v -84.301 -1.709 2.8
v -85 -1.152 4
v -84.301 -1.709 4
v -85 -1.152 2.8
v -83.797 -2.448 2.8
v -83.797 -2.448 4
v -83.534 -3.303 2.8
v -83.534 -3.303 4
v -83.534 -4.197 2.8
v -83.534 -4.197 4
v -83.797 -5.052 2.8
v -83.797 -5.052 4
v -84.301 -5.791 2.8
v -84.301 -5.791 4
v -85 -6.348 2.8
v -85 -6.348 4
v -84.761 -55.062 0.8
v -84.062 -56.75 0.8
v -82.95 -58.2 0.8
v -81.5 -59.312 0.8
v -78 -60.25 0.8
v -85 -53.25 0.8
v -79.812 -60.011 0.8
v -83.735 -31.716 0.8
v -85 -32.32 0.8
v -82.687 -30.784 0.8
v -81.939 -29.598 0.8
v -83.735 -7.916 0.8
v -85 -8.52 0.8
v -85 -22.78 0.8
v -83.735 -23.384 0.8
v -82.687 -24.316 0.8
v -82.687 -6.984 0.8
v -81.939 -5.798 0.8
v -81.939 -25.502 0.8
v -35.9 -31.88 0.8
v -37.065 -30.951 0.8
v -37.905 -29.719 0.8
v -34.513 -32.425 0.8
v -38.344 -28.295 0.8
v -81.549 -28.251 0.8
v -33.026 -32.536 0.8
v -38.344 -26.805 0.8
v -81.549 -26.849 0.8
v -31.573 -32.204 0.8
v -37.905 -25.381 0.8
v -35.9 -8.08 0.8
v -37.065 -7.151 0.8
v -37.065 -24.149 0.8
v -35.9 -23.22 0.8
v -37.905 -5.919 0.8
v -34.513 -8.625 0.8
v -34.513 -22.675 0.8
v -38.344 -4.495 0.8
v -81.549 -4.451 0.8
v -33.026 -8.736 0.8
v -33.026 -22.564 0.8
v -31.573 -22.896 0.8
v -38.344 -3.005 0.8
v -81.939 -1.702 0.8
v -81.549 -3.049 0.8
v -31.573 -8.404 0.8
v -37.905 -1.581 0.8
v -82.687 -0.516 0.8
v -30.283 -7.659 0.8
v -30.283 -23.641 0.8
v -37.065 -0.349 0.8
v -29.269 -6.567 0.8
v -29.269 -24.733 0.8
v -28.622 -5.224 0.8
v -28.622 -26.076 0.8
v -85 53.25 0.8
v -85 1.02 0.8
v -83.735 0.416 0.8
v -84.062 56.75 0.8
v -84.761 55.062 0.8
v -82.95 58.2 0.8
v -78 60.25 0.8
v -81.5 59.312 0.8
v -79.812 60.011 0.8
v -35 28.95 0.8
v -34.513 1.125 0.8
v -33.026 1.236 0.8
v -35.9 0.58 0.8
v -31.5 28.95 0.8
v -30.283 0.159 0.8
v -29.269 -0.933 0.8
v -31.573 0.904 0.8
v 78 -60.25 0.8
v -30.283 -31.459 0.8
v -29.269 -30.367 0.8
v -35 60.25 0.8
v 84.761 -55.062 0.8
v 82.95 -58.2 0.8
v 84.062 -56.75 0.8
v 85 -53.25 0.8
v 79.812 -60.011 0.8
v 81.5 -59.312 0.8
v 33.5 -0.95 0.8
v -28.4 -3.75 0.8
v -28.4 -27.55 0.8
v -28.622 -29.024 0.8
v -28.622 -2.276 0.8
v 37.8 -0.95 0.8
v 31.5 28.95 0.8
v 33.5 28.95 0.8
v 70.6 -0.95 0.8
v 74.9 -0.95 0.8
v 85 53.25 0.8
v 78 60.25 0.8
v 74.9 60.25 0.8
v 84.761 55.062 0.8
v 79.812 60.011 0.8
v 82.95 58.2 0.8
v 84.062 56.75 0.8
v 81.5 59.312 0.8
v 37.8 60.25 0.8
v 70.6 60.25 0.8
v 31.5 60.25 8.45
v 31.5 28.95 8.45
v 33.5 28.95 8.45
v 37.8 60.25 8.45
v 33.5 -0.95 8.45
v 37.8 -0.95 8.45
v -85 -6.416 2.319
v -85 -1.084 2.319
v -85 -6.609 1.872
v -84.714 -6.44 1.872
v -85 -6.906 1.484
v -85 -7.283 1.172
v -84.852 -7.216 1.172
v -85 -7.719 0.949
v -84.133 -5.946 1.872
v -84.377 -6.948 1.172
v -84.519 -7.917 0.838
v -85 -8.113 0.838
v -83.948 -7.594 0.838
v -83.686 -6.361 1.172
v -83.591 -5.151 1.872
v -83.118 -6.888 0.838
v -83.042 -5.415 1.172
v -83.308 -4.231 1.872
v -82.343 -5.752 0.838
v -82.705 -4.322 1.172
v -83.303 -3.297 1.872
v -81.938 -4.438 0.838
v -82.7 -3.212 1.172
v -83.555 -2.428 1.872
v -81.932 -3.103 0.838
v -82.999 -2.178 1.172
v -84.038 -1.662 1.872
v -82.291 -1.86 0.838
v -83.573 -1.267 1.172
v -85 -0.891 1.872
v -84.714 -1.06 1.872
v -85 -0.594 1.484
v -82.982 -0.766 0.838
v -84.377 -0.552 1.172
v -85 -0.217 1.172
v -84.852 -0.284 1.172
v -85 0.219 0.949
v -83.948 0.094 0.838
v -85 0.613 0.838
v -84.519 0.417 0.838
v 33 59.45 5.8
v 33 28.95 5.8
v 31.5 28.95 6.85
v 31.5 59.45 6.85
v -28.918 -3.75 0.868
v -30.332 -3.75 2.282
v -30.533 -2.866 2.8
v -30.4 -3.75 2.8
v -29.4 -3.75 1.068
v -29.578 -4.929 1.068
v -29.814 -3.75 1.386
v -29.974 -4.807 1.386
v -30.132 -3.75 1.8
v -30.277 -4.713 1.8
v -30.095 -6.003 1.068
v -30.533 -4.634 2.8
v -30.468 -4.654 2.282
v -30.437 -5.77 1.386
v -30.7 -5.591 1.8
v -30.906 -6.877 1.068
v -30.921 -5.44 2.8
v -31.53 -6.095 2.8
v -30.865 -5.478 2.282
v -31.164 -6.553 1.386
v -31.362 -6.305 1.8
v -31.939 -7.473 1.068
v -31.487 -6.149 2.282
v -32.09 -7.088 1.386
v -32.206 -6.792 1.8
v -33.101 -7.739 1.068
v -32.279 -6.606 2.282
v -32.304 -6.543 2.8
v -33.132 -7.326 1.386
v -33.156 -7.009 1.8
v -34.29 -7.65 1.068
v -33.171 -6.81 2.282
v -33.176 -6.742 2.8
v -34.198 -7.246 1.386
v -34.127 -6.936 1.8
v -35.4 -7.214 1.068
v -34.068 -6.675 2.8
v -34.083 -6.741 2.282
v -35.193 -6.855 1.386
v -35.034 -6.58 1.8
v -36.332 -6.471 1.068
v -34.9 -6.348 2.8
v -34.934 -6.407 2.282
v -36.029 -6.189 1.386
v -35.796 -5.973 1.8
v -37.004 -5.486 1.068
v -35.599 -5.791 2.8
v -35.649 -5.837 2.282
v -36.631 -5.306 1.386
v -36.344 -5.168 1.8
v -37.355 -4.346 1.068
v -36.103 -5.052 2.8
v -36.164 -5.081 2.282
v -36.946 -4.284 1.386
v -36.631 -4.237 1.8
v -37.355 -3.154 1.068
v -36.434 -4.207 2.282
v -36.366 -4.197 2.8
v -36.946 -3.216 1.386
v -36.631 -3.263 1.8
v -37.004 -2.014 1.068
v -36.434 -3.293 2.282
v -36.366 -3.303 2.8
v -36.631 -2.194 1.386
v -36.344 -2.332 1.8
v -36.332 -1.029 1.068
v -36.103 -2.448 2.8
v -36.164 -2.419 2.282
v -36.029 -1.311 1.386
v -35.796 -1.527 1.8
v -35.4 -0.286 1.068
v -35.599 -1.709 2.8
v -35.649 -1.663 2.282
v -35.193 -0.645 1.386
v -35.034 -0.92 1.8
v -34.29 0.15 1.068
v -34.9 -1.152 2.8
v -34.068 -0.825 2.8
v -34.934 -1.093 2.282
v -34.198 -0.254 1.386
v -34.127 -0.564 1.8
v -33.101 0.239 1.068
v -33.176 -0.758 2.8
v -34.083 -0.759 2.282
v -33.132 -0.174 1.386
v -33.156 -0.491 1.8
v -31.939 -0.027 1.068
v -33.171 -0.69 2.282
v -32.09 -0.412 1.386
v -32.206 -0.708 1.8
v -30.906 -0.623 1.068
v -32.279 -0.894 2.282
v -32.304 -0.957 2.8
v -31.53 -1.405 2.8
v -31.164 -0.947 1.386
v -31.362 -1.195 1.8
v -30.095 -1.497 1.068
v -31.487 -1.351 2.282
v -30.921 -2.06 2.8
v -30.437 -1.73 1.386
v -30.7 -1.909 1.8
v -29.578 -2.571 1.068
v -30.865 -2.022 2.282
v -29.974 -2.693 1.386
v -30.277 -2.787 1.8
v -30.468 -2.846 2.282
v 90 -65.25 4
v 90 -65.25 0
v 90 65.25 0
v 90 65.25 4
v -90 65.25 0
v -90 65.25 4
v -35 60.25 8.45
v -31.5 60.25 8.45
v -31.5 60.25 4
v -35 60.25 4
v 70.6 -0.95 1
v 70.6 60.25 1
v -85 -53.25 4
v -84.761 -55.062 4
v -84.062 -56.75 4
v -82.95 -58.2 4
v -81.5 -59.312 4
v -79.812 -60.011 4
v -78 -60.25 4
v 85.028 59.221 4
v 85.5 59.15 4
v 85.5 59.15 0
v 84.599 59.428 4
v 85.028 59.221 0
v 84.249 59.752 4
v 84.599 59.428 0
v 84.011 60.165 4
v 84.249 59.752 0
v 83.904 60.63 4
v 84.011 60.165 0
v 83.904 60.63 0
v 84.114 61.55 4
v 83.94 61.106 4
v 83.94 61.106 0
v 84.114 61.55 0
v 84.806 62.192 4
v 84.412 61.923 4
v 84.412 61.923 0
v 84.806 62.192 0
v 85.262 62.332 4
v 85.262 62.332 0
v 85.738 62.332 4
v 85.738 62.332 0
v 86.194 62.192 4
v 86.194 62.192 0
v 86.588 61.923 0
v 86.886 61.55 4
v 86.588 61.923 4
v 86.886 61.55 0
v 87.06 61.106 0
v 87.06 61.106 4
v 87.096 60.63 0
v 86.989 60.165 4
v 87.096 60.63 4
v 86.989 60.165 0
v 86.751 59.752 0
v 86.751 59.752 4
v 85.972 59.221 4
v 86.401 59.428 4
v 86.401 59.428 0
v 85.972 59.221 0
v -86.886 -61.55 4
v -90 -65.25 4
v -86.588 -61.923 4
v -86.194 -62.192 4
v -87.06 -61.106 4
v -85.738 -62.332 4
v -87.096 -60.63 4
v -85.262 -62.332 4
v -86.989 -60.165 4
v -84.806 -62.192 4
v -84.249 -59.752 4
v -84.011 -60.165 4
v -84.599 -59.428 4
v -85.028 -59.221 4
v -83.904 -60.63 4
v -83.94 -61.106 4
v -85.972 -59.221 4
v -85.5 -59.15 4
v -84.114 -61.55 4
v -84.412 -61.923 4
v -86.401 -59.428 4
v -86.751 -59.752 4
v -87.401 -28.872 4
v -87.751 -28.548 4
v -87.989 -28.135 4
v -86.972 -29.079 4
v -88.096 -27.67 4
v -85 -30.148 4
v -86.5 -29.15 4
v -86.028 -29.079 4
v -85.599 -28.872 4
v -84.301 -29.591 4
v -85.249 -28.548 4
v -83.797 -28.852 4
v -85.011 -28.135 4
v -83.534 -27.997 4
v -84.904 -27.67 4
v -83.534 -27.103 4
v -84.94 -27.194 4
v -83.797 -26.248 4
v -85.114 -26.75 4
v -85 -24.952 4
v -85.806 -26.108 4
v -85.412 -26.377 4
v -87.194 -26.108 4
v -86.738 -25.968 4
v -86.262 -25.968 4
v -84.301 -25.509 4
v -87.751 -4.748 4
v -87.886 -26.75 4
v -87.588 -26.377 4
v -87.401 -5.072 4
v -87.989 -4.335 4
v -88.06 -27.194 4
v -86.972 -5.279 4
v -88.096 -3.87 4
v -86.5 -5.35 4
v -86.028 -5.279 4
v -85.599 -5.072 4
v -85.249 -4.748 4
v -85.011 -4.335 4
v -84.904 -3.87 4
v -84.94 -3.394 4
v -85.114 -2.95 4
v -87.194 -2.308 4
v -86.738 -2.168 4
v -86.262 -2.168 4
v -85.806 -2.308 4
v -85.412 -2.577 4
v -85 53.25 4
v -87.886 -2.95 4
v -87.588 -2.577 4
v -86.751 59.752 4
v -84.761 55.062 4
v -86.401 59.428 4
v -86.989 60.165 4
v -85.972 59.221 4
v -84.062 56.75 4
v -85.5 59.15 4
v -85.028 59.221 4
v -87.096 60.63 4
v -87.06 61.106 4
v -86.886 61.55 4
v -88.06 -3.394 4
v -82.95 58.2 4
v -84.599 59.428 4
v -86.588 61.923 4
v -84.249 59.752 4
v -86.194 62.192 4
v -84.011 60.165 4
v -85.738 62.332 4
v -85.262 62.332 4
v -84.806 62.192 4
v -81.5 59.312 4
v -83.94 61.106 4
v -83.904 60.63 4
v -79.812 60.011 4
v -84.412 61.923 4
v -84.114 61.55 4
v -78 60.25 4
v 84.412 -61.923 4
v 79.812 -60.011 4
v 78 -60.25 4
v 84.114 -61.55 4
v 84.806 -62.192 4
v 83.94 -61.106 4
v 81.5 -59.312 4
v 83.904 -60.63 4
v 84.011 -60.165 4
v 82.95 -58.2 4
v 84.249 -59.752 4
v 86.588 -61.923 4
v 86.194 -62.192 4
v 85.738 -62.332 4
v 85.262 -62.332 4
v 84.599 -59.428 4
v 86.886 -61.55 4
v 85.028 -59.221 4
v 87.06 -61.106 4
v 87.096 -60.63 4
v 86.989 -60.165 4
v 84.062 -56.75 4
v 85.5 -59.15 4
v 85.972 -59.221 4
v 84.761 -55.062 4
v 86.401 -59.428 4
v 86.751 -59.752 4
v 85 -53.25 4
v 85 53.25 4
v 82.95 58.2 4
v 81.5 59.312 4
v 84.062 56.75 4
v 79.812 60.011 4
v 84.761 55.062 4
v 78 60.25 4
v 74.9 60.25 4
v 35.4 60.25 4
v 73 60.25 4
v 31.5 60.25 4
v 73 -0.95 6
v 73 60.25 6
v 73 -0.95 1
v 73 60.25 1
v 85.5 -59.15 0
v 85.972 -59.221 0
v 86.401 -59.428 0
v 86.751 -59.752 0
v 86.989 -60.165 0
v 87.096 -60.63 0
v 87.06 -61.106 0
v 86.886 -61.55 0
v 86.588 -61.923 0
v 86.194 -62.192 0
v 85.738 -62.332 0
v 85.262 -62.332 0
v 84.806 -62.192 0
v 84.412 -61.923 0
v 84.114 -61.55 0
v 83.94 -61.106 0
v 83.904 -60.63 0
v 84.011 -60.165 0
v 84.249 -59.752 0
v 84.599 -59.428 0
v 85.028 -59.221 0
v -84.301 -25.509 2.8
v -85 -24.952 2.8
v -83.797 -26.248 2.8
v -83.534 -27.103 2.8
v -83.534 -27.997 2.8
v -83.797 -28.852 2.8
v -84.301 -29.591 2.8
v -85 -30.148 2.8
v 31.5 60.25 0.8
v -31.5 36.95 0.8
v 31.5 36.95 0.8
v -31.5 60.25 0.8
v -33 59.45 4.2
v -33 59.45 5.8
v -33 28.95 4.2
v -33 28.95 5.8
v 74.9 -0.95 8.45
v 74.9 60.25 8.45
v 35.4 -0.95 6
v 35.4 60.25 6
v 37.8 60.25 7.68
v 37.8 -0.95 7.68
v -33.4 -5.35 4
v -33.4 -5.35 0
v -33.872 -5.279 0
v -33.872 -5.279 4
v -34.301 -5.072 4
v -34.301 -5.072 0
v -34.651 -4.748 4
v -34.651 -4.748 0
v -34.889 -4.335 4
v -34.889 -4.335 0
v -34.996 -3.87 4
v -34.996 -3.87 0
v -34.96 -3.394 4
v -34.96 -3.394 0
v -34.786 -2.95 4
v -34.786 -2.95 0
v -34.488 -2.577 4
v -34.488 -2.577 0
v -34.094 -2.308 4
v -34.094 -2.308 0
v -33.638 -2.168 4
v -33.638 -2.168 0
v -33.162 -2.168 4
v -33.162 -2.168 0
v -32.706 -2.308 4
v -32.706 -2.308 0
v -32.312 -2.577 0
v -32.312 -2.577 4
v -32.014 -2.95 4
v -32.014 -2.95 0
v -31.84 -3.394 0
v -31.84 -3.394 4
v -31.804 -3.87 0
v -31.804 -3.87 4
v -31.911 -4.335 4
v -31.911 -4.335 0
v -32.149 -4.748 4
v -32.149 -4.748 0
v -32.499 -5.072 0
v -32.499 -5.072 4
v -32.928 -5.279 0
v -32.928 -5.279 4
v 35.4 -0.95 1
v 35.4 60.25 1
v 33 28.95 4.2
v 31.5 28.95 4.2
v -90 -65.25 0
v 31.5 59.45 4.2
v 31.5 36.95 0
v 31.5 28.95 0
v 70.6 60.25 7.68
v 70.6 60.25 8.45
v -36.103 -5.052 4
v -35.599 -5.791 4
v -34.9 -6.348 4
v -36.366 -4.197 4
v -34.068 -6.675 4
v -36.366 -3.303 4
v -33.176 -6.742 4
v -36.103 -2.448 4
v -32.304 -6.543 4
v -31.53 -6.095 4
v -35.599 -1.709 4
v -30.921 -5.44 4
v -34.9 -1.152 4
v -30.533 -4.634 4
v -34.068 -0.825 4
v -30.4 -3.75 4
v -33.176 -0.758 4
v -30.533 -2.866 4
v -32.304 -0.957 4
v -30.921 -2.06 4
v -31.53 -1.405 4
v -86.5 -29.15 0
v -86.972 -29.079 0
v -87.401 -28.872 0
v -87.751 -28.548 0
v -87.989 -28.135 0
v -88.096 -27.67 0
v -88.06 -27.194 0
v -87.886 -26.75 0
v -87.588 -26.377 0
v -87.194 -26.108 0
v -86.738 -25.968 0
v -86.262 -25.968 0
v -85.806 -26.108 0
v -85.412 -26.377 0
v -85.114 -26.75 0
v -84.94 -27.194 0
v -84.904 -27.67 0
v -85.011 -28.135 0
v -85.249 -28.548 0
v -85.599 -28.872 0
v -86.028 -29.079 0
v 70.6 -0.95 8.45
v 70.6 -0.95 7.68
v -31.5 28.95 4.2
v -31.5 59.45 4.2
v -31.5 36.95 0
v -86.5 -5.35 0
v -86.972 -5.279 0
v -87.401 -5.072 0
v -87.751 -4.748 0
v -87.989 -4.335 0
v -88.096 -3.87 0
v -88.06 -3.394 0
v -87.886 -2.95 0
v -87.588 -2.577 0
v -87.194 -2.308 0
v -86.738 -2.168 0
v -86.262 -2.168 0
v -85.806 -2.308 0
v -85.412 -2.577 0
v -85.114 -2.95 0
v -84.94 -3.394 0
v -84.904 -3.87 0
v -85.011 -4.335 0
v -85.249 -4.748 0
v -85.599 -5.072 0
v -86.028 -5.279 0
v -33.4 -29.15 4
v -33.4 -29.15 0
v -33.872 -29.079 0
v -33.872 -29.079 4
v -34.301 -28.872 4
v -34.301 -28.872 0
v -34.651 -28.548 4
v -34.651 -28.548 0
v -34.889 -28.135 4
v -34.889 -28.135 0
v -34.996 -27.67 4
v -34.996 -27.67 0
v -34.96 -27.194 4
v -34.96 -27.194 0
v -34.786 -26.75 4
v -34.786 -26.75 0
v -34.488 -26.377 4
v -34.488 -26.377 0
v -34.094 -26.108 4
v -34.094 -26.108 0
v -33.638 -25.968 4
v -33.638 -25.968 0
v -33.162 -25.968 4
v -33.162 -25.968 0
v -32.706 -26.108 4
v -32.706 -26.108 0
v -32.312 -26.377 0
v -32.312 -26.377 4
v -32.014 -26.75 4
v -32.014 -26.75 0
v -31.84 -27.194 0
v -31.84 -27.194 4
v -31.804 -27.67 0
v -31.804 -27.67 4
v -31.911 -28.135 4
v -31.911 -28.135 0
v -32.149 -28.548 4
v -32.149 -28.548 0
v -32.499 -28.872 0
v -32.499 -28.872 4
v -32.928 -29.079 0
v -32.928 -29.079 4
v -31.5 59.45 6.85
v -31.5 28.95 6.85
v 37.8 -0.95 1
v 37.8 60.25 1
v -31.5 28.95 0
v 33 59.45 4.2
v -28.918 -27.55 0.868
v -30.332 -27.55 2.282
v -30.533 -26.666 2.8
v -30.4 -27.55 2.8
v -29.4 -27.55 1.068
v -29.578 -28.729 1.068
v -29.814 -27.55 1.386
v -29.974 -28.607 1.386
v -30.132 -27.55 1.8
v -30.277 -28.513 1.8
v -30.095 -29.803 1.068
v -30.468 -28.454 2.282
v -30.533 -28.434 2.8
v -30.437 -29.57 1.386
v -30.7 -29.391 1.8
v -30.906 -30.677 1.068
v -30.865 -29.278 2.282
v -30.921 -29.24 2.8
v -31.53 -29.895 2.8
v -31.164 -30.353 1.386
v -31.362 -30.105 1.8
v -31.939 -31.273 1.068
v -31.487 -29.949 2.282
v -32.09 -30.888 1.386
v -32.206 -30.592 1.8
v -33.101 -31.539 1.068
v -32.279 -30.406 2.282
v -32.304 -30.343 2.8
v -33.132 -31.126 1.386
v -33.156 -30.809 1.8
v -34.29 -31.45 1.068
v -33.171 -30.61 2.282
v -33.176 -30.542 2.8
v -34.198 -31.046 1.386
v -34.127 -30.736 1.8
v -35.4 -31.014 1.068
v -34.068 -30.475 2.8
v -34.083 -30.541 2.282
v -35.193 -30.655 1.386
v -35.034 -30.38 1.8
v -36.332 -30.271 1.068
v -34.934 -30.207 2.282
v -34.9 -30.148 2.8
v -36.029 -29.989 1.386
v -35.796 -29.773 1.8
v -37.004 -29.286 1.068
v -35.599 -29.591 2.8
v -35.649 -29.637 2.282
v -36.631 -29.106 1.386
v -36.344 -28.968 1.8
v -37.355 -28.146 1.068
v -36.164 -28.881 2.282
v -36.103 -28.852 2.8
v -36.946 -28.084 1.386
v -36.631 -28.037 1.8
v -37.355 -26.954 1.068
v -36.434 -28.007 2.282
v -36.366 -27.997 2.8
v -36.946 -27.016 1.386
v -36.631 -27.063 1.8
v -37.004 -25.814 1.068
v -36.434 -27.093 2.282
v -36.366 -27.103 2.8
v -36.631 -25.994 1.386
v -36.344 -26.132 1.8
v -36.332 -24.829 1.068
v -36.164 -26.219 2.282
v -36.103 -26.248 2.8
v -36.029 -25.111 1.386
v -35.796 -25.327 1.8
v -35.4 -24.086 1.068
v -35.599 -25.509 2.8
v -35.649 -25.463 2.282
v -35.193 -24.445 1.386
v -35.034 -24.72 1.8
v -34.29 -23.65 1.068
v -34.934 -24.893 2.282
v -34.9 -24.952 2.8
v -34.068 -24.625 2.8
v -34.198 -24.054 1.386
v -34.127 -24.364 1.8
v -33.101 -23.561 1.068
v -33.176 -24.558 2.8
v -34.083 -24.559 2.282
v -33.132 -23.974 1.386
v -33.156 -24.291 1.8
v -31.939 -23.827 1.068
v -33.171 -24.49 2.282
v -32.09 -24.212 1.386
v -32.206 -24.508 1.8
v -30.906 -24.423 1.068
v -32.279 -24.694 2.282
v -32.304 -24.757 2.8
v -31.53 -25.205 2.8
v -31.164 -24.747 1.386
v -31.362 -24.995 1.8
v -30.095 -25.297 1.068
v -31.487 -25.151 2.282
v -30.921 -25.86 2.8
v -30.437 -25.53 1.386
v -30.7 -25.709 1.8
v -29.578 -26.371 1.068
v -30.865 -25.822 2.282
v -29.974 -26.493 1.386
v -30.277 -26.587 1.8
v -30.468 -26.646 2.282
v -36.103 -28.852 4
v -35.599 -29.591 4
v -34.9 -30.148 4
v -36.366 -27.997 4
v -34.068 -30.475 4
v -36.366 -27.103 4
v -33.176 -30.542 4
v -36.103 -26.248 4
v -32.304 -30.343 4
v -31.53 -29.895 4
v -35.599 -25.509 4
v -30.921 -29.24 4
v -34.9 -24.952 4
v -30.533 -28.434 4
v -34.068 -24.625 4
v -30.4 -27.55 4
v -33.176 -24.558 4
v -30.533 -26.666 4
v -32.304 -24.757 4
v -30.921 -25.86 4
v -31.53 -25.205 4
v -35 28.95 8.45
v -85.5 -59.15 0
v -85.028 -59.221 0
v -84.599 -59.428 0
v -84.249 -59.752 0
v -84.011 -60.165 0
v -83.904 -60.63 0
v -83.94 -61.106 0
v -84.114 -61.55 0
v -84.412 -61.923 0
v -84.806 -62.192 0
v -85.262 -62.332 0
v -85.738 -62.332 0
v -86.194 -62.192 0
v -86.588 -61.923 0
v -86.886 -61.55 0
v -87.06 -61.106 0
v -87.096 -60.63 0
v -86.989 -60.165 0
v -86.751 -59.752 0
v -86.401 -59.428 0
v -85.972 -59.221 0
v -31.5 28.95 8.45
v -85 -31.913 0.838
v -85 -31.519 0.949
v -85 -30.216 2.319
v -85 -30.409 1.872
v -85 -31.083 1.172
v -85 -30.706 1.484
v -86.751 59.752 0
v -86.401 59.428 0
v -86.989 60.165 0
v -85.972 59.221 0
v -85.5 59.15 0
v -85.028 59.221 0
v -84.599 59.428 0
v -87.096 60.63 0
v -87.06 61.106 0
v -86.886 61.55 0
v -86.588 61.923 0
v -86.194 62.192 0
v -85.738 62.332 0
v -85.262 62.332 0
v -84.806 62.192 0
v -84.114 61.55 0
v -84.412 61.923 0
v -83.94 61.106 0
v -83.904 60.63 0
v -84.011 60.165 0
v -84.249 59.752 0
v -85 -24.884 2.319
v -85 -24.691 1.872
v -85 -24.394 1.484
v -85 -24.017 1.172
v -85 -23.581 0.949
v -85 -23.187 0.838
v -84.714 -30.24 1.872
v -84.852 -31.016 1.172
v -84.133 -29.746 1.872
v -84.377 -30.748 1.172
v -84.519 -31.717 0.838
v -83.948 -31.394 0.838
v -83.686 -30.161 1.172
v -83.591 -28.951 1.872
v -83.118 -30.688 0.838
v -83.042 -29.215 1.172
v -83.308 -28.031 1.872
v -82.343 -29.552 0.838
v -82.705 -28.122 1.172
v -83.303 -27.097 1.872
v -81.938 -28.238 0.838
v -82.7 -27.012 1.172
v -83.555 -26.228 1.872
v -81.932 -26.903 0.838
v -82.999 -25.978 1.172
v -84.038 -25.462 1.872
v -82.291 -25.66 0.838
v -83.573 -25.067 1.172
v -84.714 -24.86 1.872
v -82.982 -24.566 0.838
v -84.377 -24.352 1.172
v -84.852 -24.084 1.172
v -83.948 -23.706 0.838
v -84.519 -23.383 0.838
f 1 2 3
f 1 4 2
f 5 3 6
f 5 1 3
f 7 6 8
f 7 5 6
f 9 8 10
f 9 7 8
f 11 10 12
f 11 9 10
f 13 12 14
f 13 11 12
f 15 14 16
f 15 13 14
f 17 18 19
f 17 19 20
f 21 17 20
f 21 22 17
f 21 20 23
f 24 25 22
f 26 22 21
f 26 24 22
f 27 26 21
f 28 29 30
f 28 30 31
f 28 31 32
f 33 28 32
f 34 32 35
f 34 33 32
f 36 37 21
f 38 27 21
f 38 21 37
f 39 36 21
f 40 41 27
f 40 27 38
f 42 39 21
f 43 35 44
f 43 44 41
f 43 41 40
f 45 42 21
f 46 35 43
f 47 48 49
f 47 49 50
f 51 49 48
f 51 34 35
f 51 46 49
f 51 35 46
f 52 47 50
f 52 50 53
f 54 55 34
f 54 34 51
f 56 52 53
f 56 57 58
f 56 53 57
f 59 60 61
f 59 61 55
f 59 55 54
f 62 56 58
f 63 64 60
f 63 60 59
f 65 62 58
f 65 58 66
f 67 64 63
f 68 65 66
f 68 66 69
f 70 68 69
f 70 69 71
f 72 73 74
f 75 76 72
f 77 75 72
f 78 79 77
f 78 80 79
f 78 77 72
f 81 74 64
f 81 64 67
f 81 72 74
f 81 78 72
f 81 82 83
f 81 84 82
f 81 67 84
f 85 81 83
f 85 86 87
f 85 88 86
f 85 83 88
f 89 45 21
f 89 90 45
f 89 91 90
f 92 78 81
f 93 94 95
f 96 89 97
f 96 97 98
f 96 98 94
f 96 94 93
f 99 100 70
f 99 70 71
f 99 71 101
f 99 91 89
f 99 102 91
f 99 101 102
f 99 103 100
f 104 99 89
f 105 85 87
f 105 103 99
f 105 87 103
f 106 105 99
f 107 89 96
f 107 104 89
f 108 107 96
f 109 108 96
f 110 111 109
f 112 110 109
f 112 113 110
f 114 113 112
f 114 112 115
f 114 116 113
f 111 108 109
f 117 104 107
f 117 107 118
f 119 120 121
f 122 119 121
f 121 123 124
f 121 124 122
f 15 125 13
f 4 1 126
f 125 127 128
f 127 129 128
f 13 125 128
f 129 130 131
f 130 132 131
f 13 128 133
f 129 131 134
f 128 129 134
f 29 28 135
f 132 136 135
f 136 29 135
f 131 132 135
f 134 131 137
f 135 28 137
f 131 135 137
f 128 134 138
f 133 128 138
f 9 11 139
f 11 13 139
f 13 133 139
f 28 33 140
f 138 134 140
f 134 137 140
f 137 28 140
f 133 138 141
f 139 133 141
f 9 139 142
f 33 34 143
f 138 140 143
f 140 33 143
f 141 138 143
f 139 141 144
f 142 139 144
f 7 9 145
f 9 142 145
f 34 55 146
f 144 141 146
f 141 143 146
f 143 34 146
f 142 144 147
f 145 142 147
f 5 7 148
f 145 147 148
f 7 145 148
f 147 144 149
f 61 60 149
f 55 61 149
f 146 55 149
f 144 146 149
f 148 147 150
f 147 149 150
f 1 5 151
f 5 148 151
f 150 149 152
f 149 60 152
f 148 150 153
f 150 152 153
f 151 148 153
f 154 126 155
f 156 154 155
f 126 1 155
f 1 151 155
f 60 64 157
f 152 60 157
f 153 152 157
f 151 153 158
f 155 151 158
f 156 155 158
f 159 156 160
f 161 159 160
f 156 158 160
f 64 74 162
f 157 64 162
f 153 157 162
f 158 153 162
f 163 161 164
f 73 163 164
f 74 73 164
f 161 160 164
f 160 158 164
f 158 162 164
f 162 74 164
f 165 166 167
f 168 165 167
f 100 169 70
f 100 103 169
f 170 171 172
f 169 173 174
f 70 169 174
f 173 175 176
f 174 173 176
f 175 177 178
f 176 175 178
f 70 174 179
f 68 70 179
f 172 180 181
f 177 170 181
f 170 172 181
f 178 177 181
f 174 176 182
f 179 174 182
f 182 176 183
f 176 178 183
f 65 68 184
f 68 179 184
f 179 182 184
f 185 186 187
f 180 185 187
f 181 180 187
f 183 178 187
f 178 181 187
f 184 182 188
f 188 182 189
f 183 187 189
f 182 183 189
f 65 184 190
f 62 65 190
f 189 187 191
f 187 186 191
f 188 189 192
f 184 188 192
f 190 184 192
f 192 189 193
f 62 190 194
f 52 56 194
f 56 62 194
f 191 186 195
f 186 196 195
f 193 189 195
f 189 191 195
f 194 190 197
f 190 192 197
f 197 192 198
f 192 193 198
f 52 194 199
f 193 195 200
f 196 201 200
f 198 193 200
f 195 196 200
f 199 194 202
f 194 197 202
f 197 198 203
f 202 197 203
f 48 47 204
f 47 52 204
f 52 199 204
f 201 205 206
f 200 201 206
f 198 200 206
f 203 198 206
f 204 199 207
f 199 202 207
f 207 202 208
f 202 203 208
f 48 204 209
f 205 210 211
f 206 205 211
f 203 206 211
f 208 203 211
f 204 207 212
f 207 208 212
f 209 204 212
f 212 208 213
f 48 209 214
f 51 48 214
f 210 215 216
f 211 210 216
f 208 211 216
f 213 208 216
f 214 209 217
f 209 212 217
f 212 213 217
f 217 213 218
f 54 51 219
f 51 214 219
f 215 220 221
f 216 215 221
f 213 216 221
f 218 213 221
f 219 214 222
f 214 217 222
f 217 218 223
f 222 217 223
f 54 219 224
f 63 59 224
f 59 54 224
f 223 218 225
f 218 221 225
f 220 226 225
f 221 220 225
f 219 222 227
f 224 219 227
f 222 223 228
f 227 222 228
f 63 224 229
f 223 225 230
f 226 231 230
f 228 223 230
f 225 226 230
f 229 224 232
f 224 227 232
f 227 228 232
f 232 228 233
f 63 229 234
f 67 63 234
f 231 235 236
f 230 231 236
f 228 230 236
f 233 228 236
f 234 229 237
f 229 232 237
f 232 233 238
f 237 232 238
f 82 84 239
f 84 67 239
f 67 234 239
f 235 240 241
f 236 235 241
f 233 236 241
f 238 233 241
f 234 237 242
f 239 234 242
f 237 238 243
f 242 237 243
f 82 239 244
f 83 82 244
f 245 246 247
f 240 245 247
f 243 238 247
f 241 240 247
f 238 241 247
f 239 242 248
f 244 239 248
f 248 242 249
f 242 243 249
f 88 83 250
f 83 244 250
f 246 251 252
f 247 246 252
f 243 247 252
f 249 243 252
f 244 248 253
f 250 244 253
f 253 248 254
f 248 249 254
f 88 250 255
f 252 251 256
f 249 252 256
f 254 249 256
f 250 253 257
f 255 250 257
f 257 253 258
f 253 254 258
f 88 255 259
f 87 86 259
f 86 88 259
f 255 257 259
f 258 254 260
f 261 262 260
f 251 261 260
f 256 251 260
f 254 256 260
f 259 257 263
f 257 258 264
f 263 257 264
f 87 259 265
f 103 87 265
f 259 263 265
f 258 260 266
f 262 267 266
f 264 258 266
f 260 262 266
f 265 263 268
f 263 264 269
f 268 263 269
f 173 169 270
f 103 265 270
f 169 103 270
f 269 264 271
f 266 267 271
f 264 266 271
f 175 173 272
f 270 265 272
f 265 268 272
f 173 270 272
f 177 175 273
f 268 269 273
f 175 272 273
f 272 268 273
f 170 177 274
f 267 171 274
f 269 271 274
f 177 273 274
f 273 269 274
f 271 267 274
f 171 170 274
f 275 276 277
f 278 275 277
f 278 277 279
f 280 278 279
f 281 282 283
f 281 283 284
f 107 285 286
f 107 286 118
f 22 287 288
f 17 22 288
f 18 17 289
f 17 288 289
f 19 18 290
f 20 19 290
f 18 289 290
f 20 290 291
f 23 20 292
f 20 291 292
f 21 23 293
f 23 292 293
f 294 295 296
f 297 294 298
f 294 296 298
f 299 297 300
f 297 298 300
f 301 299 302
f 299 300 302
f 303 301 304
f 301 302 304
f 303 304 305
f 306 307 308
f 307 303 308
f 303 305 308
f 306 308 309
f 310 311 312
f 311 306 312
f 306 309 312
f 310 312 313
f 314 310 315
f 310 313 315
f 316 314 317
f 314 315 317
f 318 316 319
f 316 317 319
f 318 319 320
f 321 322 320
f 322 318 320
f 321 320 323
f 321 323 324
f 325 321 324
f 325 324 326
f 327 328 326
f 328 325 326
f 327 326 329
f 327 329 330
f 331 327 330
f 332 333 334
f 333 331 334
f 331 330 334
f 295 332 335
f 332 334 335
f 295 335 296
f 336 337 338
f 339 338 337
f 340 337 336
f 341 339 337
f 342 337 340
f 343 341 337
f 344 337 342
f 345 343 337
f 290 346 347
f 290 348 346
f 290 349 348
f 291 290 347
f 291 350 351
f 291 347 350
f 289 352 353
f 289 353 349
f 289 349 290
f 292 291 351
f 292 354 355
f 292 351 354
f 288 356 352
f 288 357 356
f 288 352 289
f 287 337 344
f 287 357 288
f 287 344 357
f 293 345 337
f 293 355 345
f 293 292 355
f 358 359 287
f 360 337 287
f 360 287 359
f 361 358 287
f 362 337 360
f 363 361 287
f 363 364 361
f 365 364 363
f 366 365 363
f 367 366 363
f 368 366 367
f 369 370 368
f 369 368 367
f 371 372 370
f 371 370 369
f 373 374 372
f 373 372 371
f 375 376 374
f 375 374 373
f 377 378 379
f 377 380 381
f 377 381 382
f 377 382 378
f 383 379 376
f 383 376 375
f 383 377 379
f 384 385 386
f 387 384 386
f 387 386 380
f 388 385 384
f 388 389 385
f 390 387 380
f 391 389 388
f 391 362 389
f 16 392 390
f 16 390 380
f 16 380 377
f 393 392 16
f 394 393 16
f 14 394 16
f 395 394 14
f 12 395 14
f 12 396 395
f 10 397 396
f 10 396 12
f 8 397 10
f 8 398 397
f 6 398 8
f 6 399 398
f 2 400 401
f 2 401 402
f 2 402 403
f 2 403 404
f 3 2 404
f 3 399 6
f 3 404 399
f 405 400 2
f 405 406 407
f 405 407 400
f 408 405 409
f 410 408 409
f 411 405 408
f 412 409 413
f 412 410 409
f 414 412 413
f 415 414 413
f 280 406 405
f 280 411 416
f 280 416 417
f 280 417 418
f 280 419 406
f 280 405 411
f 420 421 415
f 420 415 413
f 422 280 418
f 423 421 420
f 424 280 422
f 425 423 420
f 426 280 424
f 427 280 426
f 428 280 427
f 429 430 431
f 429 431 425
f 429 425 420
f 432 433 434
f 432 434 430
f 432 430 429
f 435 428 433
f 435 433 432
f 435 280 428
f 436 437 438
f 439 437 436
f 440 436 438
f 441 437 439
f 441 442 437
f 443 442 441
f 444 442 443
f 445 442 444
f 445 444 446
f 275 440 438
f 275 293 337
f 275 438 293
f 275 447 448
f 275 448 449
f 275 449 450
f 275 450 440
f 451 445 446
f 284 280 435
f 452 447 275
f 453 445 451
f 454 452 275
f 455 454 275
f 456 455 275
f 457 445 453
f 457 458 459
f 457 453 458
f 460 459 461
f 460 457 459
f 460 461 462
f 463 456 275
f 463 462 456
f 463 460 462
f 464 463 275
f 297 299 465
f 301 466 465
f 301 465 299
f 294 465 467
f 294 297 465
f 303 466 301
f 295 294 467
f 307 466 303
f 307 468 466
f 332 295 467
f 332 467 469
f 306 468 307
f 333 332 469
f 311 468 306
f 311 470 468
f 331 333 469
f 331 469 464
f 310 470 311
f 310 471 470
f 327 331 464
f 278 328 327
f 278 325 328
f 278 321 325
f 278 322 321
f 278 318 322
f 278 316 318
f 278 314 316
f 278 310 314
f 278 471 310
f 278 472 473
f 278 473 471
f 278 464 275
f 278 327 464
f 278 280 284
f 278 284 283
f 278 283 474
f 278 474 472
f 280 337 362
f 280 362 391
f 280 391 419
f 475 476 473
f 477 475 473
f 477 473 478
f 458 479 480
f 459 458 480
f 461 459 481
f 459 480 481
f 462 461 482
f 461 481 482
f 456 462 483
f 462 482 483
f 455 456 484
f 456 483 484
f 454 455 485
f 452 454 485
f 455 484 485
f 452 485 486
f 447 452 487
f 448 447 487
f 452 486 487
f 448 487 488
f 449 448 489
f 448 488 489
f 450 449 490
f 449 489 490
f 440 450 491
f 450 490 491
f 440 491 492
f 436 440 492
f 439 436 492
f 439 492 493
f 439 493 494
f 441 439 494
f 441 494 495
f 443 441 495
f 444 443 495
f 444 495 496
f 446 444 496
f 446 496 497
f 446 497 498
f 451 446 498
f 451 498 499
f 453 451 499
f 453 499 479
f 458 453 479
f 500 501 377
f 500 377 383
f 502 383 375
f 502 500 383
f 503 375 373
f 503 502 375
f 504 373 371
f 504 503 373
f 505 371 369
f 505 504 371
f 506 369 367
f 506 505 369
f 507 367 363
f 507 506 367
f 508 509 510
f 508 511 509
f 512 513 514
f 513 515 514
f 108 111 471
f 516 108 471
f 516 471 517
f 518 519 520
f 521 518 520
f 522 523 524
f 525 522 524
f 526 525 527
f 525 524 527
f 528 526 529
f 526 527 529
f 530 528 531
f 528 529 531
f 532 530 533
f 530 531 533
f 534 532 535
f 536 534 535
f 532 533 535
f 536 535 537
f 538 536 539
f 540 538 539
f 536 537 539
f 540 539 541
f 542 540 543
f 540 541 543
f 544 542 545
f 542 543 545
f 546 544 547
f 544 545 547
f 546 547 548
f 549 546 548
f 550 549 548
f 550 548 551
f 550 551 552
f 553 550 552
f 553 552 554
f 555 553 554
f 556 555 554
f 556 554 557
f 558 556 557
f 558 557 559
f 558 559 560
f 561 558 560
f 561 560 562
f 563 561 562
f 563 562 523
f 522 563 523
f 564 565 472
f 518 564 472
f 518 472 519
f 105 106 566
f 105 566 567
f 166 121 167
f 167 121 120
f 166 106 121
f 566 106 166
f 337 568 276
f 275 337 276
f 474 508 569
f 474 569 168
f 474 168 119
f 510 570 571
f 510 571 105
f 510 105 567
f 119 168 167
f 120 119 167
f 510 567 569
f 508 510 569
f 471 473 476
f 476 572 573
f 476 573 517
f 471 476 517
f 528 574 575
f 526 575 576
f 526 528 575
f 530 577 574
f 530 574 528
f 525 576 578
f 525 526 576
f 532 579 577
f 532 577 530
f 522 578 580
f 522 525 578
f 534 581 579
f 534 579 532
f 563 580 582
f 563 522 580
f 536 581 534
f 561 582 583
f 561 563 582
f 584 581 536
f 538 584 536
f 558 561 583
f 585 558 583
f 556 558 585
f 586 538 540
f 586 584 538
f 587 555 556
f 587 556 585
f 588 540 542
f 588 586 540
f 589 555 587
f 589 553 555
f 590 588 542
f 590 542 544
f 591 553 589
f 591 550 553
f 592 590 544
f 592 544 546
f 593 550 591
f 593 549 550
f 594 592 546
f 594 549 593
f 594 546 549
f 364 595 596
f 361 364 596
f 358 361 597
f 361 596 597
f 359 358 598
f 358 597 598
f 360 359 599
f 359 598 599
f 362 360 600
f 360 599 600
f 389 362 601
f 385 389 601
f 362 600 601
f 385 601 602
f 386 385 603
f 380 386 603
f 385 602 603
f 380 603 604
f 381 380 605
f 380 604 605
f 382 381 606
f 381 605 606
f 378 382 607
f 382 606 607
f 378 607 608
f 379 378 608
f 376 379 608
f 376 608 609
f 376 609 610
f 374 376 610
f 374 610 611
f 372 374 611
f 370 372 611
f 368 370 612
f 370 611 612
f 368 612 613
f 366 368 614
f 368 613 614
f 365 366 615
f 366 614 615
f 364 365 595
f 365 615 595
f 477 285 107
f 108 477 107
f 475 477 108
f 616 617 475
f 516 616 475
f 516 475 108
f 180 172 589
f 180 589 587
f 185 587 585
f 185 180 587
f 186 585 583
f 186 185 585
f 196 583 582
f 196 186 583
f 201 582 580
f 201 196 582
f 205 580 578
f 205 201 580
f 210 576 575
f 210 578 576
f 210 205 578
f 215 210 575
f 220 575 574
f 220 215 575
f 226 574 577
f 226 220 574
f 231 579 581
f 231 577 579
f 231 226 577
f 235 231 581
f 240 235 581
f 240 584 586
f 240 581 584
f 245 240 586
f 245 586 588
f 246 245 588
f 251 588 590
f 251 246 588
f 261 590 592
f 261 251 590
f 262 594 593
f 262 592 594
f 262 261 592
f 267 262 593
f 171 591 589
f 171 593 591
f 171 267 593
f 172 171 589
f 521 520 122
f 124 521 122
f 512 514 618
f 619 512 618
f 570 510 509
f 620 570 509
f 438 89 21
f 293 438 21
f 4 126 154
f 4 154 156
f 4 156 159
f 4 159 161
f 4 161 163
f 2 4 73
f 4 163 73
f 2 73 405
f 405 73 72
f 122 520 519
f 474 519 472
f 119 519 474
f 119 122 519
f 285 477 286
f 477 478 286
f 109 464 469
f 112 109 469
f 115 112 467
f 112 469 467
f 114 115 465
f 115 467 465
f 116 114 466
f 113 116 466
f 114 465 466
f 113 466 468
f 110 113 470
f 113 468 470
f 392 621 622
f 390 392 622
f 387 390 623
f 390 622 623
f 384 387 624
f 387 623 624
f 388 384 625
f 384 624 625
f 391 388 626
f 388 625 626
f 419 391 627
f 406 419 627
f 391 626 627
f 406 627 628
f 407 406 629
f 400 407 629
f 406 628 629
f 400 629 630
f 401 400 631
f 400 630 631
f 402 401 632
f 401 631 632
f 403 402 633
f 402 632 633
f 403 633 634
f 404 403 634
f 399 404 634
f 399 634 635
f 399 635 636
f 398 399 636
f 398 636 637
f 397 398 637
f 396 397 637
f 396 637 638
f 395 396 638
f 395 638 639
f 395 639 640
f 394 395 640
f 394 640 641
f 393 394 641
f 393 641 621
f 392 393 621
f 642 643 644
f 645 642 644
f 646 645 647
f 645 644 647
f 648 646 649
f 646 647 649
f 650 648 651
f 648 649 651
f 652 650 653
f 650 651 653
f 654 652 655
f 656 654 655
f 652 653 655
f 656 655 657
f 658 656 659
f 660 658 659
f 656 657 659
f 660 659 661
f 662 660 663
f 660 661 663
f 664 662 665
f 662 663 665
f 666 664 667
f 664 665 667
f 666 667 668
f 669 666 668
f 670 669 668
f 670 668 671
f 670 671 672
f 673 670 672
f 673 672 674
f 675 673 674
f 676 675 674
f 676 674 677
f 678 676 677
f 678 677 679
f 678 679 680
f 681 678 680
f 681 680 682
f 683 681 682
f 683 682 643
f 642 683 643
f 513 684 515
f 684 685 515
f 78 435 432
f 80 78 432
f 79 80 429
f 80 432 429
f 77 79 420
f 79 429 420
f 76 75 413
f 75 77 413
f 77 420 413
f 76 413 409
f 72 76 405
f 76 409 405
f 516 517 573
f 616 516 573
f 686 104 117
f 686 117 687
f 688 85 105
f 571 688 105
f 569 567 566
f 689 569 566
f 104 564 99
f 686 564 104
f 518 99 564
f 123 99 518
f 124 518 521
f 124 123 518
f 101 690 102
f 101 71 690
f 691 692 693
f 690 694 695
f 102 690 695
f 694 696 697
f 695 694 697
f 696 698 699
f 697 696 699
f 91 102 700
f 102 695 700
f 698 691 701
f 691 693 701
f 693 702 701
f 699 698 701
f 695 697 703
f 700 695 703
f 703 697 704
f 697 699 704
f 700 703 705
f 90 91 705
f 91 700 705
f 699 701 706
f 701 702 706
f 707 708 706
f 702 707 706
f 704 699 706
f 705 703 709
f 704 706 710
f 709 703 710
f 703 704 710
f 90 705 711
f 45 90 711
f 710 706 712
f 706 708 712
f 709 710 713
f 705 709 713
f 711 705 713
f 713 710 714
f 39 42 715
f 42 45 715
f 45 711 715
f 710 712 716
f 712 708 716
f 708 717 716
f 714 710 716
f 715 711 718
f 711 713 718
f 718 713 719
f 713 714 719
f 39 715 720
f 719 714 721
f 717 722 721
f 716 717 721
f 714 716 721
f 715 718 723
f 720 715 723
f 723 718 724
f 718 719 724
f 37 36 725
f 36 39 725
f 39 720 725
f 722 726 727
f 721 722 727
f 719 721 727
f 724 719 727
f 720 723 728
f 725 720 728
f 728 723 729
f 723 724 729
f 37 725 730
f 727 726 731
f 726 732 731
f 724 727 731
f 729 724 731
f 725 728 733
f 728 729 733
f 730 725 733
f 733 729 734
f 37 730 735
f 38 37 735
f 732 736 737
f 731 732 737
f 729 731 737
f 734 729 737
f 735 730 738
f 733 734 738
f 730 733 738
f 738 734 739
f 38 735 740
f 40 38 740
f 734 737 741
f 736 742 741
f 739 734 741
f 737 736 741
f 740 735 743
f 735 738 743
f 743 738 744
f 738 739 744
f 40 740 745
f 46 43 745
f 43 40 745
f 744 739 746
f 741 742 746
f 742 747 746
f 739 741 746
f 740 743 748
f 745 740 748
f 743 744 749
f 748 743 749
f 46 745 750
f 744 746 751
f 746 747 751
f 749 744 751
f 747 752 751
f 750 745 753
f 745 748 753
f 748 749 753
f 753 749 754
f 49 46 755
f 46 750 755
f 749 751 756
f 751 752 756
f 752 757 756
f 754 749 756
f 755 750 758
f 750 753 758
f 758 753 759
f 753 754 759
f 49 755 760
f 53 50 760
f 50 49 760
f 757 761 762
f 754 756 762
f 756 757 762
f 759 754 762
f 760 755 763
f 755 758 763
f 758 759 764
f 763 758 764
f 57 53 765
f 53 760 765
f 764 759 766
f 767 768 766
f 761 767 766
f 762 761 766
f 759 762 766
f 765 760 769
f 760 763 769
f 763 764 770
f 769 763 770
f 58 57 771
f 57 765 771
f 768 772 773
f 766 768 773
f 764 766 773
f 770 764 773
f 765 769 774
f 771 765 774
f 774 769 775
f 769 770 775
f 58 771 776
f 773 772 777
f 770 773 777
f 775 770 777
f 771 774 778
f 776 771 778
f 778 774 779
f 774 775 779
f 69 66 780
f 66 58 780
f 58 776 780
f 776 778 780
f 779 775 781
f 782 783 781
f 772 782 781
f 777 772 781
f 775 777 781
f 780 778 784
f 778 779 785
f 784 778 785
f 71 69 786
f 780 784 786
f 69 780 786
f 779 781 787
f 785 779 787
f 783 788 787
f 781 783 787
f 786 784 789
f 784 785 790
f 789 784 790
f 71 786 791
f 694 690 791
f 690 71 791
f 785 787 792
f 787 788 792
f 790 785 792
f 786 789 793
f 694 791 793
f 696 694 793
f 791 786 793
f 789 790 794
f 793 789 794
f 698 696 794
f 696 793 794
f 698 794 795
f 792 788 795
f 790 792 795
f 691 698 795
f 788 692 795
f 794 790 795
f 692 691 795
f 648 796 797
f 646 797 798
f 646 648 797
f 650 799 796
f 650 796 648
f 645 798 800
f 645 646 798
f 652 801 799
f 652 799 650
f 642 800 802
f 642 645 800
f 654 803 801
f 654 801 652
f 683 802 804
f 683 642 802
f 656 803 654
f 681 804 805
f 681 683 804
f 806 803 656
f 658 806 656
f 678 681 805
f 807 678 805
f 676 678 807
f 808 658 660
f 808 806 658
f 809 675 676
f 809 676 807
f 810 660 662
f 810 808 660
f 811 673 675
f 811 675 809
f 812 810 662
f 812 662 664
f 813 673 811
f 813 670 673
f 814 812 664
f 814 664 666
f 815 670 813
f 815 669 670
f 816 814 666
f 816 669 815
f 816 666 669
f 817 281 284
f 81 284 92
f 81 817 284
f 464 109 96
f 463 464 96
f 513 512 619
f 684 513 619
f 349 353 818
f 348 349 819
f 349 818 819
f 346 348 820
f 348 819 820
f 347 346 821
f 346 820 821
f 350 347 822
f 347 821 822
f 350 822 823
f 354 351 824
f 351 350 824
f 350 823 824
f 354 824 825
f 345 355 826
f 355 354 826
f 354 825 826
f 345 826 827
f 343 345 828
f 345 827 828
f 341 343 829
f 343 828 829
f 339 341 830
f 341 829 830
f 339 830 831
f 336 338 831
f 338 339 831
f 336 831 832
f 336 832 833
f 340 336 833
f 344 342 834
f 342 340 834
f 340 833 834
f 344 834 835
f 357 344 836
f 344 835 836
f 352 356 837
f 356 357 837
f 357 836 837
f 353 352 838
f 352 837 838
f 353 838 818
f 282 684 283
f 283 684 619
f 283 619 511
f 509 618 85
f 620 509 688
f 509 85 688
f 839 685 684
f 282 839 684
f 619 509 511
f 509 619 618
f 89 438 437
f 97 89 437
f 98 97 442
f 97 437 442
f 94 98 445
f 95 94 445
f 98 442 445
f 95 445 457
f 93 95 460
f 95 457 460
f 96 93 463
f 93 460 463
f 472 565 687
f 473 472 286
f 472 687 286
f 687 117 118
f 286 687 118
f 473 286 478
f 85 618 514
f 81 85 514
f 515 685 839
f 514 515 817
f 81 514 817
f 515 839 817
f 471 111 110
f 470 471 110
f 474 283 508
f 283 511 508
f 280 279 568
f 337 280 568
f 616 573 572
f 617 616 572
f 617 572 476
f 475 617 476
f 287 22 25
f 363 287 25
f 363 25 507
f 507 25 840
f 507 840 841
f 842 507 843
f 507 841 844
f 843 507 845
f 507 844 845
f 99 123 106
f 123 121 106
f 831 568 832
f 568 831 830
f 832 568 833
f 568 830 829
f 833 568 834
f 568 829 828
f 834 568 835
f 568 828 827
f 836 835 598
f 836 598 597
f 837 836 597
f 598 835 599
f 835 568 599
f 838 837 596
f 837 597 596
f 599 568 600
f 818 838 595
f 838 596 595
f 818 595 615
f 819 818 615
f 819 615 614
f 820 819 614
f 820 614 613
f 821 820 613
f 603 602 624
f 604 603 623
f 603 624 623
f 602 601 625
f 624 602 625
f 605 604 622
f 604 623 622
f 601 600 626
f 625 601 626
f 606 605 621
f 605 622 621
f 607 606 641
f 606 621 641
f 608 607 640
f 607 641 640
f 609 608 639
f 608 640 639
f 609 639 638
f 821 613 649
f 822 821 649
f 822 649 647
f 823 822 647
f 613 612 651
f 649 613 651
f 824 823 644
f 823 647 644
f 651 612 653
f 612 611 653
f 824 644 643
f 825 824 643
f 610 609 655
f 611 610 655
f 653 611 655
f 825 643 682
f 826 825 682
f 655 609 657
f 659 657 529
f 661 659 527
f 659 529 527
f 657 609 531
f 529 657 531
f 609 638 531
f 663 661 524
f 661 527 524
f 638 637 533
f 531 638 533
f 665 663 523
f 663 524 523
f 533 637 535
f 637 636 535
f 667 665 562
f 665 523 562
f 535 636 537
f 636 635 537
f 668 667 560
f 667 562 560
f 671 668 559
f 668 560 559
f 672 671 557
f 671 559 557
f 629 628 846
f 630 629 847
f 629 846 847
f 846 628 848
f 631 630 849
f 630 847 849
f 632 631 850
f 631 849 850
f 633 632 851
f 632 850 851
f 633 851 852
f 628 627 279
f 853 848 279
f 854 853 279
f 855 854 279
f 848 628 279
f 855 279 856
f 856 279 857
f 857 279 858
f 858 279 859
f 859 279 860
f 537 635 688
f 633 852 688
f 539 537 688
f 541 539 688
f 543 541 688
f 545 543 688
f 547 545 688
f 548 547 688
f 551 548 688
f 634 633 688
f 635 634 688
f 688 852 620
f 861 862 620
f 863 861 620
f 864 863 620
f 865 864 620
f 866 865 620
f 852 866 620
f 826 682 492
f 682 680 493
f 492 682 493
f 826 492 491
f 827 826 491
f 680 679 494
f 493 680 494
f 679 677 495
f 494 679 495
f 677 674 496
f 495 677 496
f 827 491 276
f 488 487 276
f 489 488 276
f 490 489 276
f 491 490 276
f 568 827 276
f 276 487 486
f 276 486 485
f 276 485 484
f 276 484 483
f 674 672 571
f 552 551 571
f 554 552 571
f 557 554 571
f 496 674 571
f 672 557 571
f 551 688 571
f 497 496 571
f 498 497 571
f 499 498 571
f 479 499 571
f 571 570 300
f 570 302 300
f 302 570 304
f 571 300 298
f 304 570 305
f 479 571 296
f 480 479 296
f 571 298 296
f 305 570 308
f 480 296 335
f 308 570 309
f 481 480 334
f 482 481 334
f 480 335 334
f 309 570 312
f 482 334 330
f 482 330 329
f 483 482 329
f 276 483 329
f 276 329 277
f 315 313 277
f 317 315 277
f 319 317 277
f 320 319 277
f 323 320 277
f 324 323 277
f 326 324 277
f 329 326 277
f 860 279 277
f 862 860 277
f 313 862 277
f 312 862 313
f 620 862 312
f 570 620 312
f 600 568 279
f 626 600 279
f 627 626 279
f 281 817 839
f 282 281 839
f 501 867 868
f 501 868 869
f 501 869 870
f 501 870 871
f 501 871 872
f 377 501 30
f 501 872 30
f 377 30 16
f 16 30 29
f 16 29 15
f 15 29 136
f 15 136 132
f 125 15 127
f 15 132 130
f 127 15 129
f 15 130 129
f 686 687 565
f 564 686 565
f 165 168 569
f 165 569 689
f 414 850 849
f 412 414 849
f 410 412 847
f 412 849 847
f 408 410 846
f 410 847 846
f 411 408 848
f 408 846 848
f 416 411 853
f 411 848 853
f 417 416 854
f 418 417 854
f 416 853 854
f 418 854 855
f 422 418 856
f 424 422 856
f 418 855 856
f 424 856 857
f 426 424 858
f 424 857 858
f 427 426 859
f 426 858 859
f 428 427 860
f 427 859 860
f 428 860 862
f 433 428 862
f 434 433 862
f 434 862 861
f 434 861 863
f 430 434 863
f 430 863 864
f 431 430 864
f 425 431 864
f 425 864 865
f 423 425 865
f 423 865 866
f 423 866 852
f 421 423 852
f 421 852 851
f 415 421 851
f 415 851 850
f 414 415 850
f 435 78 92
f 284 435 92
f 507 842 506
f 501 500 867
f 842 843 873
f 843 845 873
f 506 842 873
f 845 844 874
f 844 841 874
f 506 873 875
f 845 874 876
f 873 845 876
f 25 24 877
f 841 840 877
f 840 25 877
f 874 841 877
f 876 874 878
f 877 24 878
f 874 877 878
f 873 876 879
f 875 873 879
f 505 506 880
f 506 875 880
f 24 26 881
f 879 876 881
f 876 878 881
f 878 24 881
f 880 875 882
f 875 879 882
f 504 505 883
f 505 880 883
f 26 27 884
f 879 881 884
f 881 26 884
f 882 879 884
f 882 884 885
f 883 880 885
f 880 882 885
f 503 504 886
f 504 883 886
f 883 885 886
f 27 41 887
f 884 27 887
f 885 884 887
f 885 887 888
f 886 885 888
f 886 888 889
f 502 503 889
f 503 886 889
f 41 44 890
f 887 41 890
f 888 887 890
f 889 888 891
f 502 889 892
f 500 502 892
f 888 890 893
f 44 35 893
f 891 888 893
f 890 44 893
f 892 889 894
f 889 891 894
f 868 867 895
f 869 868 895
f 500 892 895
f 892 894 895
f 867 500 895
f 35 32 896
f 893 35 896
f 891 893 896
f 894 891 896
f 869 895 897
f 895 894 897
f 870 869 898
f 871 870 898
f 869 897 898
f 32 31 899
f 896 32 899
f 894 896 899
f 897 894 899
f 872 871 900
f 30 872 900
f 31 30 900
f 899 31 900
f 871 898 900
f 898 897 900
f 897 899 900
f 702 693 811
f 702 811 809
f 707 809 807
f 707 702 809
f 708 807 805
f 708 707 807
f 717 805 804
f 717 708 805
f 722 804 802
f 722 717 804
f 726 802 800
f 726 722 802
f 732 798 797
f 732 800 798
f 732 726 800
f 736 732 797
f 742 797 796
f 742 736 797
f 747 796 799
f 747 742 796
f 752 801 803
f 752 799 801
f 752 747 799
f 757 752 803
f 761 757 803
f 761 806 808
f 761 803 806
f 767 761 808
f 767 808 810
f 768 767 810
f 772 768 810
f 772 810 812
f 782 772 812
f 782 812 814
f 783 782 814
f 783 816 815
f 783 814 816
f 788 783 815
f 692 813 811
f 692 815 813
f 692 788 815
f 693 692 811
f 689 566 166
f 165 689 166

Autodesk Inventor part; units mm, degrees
ref_plane "YZ Plane" through (0, 0, 0) normal (1, 0, 0) x (0, 1, 0)
ref_plane "XY Plane" through (0, 0, 0) normal (0, 0, 1) x (1, 0, 0)
sketch "Skizze1" plane through (0, 0, 0) normal (0, 0, 1) x (1, 0, 0)
  line L0 (-90, -65.25) -> (90, -65.25)
  line L1 (90, -65.25) -> (90, 65.25)
  line L2 (90, 65.25) -> (-90, 65.25)
  line L3 (-90, 65.25) -> (-90, -65.25)
  line L4 (-90, -65.25) -> (90, 65.25) construction
  line L5 (90, -65.25) -> (-90, 65.25) construction
  point P0 (0, 0)
  dimension "d0" = 180
  dimension "d1" = 130.5
extrude "Extrusion1" add sketch "Skizze1" along normal blind 0.8
sketch "Skizze2" plane through (0, 0, 0.8) normal (0, 0, 1) x (1, 0, 0)
  line L0 (90, -65.25) -> (90, 65.25) projected
  line L1 (90, 65.25) -> (-90, 65.25) projected
  line L2 (-90, 65.25) -> (-90, -65.25) projected
  line L3 (-90, -65.25) -> (90, -65.25) projected
  line L4 (-85, 60.25) -> (85, 60.25)
  line L5 (85, 60.25) -> (85, -60.25)
  line L6 (85, -60.25) -> (-85, -60.25)
  line L7 (-85, -60.25) -> (-85, 60.25)
  point P0 (0, 0)
  dimension "d4" = 5
extrude "Extrusion2" add sketch "Skizze2" along normal blind 3.2
ref_plane "Arbeitsebene1" through (0, 28.95, 0) normal (0, 1, 0) x (-1, 0, 0)
sketch "Skizze4" plane through (0, 28.95, 0) normal (0, 1, 0) x (-1, 0, 0)
  line L0 (0, 0) -> (0, 5.6907) construction
  line L1 (-85, 0.8) -> (85, 0.8) projected
  line L2 (31.5, 0.8) -> (35, 0.8)
  line L3 (35, 8.4503) -> (31.5, 8.4503)
  line L4 (35, 8.4503) -> (35, 0.8)
  line L5 (31.5, 8.4503) -> (31.5, 6.8503)
  line L6 (31.5, 6.8503) -> (33, 5.8)
  line L7 (33, 5.8) -> (31.5, 6.8503)
  line L8 (33, 5.8) -> (33, 4.2)
  line L9 (33, 4.2) -> (31.5, 4.2)
  line L10 (31.5, 4.2) -> (31.5, 0.8)
  line L11 (-90, 0) -> (90, 0) projected
  dimension "d8" = 33
  dimension "d9" = 1.6
  dimension "d11" = 125
  dimension "d12" = 1.5
  dimension "d13" = 1.6
  dimension "d14" = 2
  dimension "d17" = 4.2
extrude "Extrusion3" add sketch "Skizze4" along normal up to surface (31.3 mm away)
sketch "Skizze5" plane through (-35, 60.25, 4) normal (0, 1, 0) x (1, 0, 0)
  line L0 (0, -4.4503) -> (3.5, -4.4503) projected
  line L1 (2, -0.2) -> (3.5, -0.2) projected
  line L2 (3.5, -4.4503) -> (3.5, -0.2)
  line L3 (3.5, -0.2) -> (0, -0.2)
  line L4 (0, 3.2) -> (0, -4.4503) projected
  line L5 (0, -0.2) -> (0, -4.4503)
  line L6 (0, -4.4503) -> (3.5, -4.4503)
  point P0 (35, 4)
  point P1 (0, -0.2)
  point P2 (0, 4.4503)
  point P3 (3.5, 4.4503)
  point P4 (2, 0.2)
  point P5 (3.5, 0.2)
  point P6 (0, 0)
  point P7 (0, -3.2)
extrude "Extrusion4" add sketch "Skizze5" against normal blind 0.8
mirror "Spiegeln1" about plane through (0, 0, 0) normal (1, 0, 0) of "Extrusion3", "Extrusion4"
sketch "Skizze6" plane through (0, 0, 0.8) normal (0, 0, 1) x (1, 0, 0)
  line L0 (-31.5, 28.95) -> (-35, 28.95) projected
  line L1 (31.5, 28.95) -> (31.5, 60.25) projected
  line L2 (-31.5, 28.95) -> (31.5, 28.95)
  line L3 (31.5, 28.95) -> (31.5, 36.95)
  line L4 (31.5, 36.95) -> (-31.5, 36.95)
  line L5 (-31.5, 36.95) -> (-31.5, 28.95)
  point P0 (0, 0)
  dimension "d20" = 8
extrude "Extrusion5" cut sketch "Skizze6" against normal up to surface (0.8 mm away)
sketch "Skizze7" plane through (85, 60.25, 0.8) normal (0, -1, 0) x (1, 0, 0)
  line L0 (0, 0) -> (-50, 0) projected
  line L1 (-47.2, 0) -> (-47.2, 0.2)
  line L2 (-47.2, 0.2) -> (-49.6, 0.2)
  line L3 (-49.6, 0.2) -> (-49.6, 5.2)
  line L4 (5, 3.2) -> (-175, 3.2) projected
  line L5 (-49.6, 5.2) -> (-47.2, 6.8805)
  line L6 (-47.2, 6.8805) -> (-47.2, 7.6503)
  line L7 (-47.2, 7.6503) -> (-51.5, 7.6503)
  line L8 (-51.5, 7.6503) -> (-51.5, 0)
  line L9 (-51.5, 0) -> (-47.2, 0)
  line L10 (-50, 0) -> (-50, 7.6503) projected
  line L11 (-50, 7.6503) -> (-53.5, 7.6503) projected
  point P0 (-85, -0.8)
  point P1 (-50, 3.2)
  dimension "d23" = 0.2
  dimension "d24" = 5
  dimension "d25" = 125
  dimension "d26" = 2.4
  dimension "d31" = 1.5
  dimension "d32" = 0.4
extrude "Extrusion6" add sketch "Skizze7" along normal blind 61.2
ref_plane "Arbeitsebene2" through (54.2, 60.25, 6) normal (1, 0, 0) x (0, 0, -1)
mirror "Spiegeln2" about plane through (54.2, 60.25, 6) normal (1, 0, 0) of "Extrusion6"
sketch "Skizze8" plane through (0, 0, 0.8) normal (0, 0, 1) x (1, 0, 0)
  circle A0 centre (-86.5, -3.75) radius 3
  circle A1 centre (-33.4, -3.75) radius 3
  circle A2 centre (-33.4, -27.55) radius 3
  circle A3 centre (-86.5, -27.55) radius 3
  line L0 (-33.4, -27.55) -> (-33.4, -3.75) construction
  line L1 (-35, 28.95) -> (-35, 60.25) projected
  line L2 (-35, 28.95) -> (-35, -60.25) construction
  line L3 (85, -60.25) -> (-85, -60.25) projected
  line L4 (-33.4, -15.65) -> (-35, -15.65) construction
  line L5 (-90, 65.25) -> (-90, -65.25) projected
  point P0 (0, 0)
  dimension "d33" = 53.1
  dimension "d34" = 23.8
  dimension "d35" = 6
  dimension "d36" = 3.5
extrude "Extrusion7" add sketch "Skizze8" along normal blind 3.2
sketch "Skizze9" plane through (-33.4, -3.75, 4) normal (0, 0, 1) x (1, 0, 0)
  circle A0 centre (0, 0) radius 3 projected
  circle A1 centre (0, -23.8) radius 3 projected
  arc A2 (-51.6, -2.5981) -> (-51.6, 2.5981) centre (-53.1, 0) ccw projected
  arc A3 (-51.6, -26.3981) -> (-51.6, -21.2019) centre (-53.1, -23.8) ccw projected
  point P0 (33.4, 3.75)
hole "Bohrung1" at (-33.4, -3.75, 4) at (-33.4, -27.55, 4) at (-86.5, -3.75, 4) at (-86.5, -27.55, 4) direction (0, 0, -1) diameter 3.2 end through all
fillet "Rundung1" radius 2 4 edges at (-83.5, -3.75, 0.8) (-83.5, -27.55, 0.8) (-36.4, -27.55, 0.8) (-36.4, -3.75, 0.8)
fillet "Rundung2" radius 7 4 edges at (-85, 60.25, 2.4) (85, 60.25, 2.4) (85, -60.25, 2.4) (-85, -60.25, 2.4)
sketch "Skizze10" plane through (0, 0, 4) normal (0, 0, 1) x (1, 0, 0)
  line L0 (90, 65.25) -> (-90, 65.25) projected
  line L1 (-90, 65.25) -> (-90, -65.25) projected
  point P0 (0, 0)
  point P1 (-85.5, 60.75)
  dimension "d48" = 4.5
  dimension "d49" = 4.5
hole "Bohrung2" at (-85.5, 60.75, 4) direction (0, 0, -1) diameter 3.2 depth 15
mirror "Spiegeln3" about plane through (0, 0, 0) normal (1, 0, 0) of "Bohrung2"
mirror "Spiegeln4" about plane through (0, 0, 0) normal (0, 1, 0) of "Bohrung2", "Spiegeln3"
equation "\"d49\" = d48"
properties part number "Back Cover v5"
